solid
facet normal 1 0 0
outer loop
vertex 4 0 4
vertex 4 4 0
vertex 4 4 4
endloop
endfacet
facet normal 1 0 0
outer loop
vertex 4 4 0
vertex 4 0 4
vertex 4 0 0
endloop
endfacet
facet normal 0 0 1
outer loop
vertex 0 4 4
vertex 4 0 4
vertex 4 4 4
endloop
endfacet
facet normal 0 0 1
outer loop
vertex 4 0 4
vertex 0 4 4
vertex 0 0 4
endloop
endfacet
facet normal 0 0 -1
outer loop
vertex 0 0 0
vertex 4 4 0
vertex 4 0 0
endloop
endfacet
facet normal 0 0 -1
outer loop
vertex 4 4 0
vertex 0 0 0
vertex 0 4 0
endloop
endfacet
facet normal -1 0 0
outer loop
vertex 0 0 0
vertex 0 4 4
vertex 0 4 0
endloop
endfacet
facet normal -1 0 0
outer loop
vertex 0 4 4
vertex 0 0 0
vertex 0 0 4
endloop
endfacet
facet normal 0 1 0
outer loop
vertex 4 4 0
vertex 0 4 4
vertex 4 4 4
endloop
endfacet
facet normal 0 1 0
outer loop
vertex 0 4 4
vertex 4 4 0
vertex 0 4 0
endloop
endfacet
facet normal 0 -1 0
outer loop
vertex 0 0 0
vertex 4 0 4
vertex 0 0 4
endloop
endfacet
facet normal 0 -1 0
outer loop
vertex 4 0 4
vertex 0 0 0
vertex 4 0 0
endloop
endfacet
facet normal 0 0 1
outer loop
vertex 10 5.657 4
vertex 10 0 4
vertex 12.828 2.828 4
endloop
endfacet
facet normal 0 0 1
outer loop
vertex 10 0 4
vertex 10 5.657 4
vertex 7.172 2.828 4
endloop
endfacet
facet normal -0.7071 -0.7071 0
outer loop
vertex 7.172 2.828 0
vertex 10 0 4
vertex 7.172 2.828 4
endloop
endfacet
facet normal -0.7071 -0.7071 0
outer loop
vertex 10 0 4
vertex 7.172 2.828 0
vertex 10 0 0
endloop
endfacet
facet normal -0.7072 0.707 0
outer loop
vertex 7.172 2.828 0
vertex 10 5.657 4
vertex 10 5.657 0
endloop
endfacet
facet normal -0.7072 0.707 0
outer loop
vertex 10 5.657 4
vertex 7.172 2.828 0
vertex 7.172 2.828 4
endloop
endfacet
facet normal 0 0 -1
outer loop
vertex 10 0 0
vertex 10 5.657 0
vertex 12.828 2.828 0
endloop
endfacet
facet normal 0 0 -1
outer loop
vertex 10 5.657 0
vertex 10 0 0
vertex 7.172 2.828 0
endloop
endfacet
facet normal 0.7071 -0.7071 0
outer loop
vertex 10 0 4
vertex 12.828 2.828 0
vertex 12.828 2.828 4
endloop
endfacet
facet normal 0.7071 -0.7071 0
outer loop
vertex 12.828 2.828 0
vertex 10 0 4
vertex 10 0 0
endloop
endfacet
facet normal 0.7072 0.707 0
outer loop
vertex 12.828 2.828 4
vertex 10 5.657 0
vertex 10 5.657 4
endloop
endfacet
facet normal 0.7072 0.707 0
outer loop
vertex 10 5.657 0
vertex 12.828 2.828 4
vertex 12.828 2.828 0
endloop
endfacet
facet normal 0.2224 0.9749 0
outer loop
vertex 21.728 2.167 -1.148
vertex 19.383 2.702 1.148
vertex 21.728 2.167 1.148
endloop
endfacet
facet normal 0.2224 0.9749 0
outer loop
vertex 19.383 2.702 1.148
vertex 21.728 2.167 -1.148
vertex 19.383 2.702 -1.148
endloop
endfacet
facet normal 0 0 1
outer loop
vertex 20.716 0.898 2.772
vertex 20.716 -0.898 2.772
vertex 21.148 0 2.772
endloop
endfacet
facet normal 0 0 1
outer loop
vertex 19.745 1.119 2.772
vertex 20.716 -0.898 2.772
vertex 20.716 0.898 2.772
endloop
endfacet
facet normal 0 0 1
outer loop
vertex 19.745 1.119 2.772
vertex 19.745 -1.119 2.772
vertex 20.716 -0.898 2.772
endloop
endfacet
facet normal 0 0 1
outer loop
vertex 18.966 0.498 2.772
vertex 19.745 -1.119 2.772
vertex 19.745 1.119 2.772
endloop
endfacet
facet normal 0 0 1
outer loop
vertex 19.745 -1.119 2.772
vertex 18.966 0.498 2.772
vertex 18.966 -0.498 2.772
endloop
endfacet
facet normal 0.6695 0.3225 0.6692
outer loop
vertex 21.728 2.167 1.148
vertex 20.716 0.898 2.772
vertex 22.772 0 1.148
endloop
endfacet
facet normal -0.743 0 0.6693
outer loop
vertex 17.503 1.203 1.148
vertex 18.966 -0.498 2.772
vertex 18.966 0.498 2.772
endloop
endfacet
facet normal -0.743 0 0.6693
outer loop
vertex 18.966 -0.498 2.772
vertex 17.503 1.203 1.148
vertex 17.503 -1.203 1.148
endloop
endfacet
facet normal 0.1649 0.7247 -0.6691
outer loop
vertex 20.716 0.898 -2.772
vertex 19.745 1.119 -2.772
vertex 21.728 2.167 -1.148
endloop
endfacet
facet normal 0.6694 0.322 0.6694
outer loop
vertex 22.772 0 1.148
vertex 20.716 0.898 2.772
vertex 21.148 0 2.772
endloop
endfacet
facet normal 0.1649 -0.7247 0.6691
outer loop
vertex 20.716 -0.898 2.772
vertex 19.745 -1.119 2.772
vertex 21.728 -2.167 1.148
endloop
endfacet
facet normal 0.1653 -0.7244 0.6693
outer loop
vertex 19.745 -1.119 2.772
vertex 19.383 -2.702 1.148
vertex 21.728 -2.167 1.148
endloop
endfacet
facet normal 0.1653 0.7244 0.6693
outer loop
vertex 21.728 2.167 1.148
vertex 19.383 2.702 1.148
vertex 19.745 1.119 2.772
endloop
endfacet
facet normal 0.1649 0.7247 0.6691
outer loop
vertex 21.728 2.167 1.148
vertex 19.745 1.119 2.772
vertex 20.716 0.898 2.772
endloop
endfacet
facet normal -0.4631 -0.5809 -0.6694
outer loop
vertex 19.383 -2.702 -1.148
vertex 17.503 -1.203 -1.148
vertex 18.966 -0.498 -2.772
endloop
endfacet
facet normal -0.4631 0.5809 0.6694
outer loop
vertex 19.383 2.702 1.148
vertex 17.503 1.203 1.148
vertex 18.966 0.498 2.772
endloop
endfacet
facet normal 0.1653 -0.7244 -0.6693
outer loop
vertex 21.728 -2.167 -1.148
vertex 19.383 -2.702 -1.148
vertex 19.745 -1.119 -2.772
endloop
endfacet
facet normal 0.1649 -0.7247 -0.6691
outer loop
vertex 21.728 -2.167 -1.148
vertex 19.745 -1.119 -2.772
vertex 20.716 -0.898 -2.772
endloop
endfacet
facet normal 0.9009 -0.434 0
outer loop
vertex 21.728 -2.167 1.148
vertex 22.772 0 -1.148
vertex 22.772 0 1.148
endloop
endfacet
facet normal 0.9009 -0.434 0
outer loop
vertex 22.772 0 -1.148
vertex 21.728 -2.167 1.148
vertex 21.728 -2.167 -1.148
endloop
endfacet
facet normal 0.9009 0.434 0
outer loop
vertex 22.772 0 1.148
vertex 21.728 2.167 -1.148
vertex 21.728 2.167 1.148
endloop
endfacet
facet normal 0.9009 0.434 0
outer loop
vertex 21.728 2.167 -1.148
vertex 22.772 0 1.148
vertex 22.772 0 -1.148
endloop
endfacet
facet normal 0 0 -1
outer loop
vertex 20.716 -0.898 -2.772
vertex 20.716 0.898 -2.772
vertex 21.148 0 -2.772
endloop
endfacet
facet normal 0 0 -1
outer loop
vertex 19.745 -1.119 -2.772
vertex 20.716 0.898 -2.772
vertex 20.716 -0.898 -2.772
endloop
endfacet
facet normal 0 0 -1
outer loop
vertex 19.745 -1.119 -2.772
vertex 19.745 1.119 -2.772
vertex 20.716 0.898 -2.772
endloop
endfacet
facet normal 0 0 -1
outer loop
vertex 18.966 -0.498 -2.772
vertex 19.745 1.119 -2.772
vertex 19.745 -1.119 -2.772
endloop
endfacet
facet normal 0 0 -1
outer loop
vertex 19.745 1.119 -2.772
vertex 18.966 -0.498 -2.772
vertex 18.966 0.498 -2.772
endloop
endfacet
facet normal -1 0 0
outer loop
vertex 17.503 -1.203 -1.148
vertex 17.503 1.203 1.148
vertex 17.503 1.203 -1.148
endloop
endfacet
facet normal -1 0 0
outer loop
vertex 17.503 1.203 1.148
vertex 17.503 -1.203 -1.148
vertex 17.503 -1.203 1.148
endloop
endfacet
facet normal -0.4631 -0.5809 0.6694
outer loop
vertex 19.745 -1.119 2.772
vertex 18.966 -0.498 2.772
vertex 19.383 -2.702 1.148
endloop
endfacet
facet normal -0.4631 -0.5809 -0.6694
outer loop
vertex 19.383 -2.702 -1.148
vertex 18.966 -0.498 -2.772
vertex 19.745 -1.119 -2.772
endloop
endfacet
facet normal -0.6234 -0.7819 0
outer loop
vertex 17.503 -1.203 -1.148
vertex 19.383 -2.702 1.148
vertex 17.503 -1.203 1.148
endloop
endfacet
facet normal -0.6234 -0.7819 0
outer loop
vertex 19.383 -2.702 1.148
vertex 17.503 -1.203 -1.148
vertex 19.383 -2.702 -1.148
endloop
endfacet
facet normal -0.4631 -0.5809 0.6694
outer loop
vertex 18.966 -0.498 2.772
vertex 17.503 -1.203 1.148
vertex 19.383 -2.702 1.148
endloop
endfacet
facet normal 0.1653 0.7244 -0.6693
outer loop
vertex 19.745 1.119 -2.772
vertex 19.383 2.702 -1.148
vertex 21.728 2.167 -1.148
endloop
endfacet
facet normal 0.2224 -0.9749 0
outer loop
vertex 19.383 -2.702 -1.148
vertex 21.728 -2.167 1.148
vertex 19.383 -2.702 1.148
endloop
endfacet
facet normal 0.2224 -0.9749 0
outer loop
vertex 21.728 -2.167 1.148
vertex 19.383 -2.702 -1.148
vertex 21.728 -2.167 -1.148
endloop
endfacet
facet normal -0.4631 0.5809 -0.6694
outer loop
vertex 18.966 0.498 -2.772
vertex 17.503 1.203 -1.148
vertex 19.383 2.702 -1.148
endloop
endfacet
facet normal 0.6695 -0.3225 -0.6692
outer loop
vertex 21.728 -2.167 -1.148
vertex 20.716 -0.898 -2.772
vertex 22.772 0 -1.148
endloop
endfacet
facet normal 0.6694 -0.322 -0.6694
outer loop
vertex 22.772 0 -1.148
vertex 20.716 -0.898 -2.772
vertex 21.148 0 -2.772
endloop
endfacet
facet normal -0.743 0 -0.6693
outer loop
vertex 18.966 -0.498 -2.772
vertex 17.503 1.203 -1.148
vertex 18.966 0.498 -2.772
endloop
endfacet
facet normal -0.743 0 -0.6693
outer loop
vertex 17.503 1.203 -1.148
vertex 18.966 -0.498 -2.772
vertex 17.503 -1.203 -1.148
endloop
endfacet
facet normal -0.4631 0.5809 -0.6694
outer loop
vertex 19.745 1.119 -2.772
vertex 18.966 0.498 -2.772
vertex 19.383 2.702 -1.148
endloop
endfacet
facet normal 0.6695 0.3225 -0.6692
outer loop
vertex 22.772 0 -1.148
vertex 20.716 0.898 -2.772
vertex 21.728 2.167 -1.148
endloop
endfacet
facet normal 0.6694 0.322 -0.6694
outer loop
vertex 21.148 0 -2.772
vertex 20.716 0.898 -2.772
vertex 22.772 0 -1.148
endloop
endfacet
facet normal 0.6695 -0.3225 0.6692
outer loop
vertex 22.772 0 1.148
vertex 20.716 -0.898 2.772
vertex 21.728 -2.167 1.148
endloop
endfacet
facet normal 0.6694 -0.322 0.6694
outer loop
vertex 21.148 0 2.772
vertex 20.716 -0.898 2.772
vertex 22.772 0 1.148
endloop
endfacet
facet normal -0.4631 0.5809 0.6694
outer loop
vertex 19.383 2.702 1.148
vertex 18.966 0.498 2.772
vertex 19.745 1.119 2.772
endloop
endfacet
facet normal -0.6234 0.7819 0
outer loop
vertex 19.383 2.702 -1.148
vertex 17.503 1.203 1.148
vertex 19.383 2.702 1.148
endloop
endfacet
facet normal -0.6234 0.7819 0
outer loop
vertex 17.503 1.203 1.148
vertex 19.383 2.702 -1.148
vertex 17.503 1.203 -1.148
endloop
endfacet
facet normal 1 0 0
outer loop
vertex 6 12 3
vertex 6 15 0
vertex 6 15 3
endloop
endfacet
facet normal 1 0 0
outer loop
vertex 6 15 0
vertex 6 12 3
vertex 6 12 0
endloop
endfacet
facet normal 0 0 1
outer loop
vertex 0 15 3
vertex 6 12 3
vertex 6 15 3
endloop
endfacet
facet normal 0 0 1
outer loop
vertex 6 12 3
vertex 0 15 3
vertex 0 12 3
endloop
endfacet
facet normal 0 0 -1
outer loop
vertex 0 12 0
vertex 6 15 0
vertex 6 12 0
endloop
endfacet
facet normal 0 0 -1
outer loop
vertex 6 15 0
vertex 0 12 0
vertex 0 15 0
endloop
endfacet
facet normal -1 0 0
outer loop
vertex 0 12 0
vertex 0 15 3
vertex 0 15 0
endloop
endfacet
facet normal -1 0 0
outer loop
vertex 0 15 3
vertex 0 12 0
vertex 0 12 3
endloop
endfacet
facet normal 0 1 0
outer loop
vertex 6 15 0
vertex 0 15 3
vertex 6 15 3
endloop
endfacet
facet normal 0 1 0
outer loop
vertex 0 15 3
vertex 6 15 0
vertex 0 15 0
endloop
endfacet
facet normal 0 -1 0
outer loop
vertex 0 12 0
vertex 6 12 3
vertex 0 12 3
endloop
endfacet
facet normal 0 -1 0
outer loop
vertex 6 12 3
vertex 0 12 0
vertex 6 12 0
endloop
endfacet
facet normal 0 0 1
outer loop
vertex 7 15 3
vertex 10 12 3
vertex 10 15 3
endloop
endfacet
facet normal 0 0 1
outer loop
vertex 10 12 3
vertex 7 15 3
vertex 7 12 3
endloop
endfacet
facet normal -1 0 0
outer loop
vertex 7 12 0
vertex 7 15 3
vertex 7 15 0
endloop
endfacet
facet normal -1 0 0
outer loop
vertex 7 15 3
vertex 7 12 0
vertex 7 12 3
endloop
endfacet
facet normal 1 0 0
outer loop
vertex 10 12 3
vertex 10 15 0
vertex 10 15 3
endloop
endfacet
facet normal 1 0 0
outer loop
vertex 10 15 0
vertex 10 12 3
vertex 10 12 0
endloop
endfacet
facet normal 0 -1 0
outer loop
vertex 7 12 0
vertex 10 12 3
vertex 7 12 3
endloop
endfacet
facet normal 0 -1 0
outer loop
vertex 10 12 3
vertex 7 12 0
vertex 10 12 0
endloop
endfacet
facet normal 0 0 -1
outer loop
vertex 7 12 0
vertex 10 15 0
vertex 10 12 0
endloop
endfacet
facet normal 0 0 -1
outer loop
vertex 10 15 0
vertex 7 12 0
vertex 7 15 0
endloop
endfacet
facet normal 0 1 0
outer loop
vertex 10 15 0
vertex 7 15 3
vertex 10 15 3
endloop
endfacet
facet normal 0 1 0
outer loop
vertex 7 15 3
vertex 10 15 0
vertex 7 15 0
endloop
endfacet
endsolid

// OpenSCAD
// Focused test: transforms — translate, rotate, uniform & non-uniform scale, mirror.

cube([4, 4, 4]);

translate([10, 0, 0])
  rotate([0, 0, 45])
    cube([4, 4, 4]);

// uniform scale (rigid-ish — handled exactly)
translate([20, 0, 0])
  scale(1.5) sphere(2);

// non-uniform scale — must rewrite the BREP (gp_GTrsf)
translate([0, 12, 0])
  scale([2, 1, 1]) cube([3, 3, 3]);

// mirror
translate([12, 12, 0])
  mirror([1, 0, 0]) translate([2, 0, 0]) cube([3, 3, 3]);
